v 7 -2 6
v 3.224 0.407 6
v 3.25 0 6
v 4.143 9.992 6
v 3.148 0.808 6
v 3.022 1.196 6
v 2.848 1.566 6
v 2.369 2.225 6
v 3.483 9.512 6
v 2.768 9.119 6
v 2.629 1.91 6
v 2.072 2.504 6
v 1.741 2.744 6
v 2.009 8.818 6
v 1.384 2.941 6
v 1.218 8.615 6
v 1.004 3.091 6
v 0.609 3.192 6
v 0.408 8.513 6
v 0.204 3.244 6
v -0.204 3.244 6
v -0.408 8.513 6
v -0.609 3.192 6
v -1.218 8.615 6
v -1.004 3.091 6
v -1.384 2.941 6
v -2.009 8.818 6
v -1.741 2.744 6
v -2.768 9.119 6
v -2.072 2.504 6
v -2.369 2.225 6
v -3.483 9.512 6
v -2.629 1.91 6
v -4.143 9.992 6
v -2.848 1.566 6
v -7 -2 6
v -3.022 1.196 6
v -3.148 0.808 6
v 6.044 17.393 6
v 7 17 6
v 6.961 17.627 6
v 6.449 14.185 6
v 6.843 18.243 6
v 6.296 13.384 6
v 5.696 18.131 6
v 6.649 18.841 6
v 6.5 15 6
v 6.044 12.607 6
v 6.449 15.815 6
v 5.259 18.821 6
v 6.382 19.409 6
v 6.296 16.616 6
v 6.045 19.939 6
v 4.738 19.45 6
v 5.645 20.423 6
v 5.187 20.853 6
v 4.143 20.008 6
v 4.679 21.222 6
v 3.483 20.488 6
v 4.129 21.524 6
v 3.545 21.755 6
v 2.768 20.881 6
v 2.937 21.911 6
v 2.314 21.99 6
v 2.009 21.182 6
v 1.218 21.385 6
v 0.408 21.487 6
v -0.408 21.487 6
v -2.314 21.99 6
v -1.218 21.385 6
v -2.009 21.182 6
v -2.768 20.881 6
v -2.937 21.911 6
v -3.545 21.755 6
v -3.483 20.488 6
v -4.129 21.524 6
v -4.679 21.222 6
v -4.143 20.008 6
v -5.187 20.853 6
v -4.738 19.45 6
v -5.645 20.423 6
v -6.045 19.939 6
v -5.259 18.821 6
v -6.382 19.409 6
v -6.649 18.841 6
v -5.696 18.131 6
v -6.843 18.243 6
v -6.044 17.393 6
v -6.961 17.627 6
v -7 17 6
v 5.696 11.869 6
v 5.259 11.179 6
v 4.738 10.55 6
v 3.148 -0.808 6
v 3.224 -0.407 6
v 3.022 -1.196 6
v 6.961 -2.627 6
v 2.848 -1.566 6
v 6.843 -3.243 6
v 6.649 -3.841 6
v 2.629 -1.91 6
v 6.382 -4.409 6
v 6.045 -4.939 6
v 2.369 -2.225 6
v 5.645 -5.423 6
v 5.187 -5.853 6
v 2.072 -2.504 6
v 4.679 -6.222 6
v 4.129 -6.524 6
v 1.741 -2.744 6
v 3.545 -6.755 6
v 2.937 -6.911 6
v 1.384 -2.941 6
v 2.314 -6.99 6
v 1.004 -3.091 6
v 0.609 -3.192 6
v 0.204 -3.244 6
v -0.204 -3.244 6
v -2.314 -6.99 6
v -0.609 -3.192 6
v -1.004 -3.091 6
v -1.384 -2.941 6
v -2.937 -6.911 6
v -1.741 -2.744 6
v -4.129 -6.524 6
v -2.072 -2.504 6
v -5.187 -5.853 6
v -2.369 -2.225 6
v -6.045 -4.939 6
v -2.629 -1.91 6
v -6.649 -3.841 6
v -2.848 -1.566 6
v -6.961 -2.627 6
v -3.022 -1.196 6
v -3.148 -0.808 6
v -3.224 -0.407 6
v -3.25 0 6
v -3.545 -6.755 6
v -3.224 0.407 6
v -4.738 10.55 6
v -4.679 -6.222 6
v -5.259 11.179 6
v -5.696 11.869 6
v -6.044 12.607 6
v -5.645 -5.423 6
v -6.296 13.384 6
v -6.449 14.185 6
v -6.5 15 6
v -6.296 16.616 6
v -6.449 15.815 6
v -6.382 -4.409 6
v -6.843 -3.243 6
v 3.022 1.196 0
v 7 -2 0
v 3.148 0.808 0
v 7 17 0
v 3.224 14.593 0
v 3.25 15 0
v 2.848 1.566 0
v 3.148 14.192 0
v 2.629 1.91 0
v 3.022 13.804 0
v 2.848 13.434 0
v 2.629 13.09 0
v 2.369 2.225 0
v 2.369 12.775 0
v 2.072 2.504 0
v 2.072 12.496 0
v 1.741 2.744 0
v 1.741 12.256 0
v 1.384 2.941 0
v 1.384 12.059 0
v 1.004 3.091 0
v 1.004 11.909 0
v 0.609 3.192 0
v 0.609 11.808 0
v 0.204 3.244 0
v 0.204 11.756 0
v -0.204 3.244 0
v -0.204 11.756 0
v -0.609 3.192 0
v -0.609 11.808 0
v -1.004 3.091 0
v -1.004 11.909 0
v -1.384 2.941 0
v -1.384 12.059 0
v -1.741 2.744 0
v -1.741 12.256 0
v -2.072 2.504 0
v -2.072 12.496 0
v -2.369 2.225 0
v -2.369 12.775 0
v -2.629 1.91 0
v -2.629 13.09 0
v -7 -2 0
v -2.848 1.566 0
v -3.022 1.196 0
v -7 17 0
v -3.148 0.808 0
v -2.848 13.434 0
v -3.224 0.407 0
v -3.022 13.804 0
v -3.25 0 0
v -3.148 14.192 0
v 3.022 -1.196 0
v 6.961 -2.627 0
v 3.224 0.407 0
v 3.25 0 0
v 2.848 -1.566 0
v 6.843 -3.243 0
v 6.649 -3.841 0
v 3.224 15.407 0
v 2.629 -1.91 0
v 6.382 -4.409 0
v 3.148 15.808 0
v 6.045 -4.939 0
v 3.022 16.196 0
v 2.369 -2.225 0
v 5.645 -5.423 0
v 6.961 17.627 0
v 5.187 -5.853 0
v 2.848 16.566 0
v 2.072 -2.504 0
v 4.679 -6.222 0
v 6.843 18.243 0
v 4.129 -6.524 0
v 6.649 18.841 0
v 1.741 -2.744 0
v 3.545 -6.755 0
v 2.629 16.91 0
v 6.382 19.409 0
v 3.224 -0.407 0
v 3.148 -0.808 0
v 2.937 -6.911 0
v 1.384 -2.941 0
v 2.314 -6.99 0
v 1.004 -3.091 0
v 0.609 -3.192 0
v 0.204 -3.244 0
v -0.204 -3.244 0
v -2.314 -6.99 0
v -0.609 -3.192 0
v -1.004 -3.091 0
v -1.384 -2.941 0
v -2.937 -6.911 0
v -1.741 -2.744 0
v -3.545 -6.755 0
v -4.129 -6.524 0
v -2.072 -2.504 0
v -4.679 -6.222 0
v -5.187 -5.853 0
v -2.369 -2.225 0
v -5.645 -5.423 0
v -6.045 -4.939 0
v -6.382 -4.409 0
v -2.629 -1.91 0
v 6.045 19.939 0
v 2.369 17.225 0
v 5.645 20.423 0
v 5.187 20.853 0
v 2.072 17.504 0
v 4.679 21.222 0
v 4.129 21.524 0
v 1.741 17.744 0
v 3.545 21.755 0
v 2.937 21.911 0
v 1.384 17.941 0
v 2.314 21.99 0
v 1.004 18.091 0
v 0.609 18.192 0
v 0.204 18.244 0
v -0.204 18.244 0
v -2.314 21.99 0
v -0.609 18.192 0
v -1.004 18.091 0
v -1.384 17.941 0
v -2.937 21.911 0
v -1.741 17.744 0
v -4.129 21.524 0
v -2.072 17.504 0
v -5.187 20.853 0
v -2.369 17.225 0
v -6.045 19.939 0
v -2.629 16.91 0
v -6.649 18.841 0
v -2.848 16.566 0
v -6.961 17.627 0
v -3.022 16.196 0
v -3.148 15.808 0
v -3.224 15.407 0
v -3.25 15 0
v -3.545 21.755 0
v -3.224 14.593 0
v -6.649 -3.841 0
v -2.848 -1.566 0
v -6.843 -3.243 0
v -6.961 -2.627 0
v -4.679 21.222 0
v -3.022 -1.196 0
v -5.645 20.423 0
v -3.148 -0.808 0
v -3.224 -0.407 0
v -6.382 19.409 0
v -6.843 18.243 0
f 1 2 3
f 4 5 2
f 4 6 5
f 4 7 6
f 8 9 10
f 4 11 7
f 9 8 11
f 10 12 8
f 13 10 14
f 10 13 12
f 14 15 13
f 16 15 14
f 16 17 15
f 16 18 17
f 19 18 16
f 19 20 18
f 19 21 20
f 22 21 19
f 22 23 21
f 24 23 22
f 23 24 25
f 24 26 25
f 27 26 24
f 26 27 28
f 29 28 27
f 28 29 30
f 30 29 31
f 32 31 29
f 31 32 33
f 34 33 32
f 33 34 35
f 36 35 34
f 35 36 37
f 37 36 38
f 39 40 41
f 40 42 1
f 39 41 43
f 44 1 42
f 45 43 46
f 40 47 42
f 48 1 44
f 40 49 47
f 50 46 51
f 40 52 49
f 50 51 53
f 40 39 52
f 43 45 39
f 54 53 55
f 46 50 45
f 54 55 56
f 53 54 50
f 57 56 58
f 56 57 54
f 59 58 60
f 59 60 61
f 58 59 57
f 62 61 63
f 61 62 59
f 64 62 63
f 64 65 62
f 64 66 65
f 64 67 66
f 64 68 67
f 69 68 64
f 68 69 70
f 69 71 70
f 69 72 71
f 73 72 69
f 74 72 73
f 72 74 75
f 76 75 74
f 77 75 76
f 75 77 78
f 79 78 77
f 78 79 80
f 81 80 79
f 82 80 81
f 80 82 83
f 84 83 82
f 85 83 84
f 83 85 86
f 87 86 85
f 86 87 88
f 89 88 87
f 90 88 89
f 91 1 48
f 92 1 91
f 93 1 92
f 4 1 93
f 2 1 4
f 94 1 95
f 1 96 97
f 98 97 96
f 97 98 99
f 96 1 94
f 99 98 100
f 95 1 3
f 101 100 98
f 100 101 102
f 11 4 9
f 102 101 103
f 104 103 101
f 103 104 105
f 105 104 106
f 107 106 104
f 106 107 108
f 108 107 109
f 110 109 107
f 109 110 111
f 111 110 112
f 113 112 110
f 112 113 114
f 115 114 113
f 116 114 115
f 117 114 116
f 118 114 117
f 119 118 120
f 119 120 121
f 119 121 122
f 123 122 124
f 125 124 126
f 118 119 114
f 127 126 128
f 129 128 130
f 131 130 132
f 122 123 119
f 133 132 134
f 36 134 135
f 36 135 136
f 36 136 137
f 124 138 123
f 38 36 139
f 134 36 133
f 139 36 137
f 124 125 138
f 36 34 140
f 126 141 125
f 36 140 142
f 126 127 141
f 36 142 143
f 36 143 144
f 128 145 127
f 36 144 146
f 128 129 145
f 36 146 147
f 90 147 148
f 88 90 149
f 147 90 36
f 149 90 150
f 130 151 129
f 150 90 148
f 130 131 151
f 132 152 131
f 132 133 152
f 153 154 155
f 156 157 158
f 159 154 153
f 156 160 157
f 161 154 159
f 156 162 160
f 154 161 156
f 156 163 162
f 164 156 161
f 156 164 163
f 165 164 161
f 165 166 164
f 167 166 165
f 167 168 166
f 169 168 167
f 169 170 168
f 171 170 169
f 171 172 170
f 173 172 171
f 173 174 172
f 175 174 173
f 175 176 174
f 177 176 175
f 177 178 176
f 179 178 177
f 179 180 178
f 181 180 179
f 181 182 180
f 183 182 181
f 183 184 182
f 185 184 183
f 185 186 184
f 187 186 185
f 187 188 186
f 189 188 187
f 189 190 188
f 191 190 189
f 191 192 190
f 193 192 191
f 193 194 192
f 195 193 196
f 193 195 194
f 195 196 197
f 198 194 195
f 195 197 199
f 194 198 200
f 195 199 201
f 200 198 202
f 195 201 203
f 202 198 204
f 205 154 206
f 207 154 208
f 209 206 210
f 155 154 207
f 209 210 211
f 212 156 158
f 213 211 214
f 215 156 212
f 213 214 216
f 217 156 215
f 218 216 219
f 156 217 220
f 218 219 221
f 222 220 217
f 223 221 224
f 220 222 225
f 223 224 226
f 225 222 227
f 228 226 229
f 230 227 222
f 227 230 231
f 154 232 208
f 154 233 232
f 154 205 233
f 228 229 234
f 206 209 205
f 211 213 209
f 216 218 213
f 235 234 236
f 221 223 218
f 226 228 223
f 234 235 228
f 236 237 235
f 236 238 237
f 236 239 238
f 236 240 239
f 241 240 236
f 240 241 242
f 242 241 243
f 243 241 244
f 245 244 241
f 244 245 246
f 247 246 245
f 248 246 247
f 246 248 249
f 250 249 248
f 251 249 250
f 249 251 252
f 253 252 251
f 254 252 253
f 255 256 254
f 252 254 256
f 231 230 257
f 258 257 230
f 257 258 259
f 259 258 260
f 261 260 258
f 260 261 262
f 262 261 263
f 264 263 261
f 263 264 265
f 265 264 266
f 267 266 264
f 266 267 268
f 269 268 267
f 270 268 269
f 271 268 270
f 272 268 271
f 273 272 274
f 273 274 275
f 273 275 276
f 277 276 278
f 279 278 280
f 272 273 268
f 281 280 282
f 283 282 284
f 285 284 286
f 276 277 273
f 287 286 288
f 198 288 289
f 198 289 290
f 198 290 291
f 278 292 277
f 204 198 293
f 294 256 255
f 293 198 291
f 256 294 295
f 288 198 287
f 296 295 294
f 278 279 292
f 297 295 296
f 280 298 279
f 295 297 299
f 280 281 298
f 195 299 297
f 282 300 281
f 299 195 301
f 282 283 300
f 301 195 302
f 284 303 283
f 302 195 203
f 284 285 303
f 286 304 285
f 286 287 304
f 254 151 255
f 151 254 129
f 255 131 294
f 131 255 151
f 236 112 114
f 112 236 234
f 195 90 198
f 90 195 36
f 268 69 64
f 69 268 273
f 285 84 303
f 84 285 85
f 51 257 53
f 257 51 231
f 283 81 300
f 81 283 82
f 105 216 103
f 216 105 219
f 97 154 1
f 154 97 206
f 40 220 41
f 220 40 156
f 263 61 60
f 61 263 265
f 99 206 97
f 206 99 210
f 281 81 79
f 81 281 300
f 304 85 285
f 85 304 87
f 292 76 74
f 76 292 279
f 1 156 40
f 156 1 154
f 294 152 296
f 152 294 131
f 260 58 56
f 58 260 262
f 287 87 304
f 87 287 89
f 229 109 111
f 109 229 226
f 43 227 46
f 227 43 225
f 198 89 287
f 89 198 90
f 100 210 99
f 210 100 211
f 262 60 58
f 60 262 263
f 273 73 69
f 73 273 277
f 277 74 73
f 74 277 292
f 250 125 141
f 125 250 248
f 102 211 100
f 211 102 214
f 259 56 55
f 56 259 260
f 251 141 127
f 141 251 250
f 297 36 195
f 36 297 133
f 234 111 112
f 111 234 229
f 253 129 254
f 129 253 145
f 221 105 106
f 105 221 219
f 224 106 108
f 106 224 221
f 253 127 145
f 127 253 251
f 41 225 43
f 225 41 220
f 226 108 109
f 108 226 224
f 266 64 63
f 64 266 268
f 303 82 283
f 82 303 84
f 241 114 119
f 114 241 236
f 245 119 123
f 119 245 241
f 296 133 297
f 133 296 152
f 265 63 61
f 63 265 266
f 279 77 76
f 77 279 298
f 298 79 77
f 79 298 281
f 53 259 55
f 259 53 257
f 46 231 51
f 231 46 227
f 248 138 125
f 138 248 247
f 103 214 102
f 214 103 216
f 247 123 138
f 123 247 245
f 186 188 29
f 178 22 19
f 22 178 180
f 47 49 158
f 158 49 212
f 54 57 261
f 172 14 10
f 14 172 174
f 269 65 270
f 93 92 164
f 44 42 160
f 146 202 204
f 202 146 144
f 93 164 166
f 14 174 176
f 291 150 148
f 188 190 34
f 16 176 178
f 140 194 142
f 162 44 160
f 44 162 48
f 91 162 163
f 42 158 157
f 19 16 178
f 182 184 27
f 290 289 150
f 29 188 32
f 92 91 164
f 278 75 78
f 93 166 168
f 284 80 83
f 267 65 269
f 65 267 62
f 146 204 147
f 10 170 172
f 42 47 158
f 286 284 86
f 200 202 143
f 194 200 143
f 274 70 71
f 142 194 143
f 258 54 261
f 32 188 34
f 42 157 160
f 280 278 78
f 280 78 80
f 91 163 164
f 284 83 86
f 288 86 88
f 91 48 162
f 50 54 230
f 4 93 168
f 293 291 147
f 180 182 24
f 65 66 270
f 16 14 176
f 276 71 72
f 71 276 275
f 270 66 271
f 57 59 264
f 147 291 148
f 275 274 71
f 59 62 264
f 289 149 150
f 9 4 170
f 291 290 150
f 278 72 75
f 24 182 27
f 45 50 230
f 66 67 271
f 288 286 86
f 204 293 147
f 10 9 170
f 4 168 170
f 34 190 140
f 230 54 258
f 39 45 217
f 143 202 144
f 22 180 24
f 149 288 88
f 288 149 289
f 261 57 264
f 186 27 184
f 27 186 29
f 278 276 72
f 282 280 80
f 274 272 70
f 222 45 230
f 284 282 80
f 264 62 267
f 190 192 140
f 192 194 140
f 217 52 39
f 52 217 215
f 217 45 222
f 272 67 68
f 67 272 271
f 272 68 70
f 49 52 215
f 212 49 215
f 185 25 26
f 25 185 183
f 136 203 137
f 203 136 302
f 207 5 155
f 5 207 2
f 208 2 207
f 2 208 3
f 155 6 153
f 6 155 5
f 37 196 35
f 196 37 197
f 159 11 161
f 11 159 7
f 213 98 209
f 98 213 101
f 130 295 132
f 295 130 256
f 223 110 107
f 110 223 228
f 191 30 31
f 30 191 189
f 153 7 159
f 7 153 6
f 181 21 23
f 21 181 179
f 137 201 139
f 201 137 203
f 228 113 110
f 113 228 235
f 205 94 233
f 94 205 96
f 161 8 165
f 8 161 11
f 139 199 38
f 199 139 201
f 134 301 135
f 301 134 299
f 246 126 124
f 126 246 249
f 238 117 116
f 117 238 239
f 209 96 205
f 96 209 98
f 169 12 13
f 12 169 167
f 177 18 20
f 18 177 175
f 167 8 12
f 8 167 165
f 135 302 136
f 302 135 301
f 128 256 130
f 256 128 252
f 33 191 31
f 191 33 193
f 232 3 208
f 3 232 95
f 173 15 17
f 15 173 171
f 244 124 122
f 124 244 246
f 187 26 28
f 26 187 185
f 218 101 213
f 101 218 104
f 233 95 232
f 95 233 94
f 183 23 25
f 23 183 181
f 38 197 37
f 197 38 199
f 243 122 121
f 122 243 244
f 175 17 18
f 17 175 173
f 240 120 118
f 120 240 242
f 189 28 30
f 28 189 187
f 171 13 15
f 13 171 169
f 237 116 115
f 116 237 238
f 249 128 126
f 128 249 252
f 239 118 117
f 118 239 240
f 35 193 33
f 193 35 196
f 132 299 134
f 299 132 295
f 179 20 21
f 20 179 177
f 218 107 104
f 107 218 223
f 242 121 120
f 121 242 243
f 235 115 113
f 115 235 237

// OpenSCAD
$fn = 50;


difference() {
	union() {
		cylinder(h = 6, r = 7.0000000000);
		translate(v = [0.0000000000, 7.5000000000, 0]) {
			hull() {
				translate(v = [-2.0000000000, 9.5000000000, 0]) {
					cylinder(h = 6, r = 5);
				}
				translate(v = [2.0000000000, 9.5000000000, 0]) {
					cylinder(h = 6, r = 5);
				}
				translate(v = [-2.0000000000, -9.5000000000, 0]) {
					cylinder(h = 6, r = 5);
				}
				translate(v = [2.0000000000, -9.5000000000, 0]) {
					cylinder(h = 6, r = 5);
				}
			}
		}
		translate(v = [0.0000000000, 7.5000000000, 0]) {
			hull() {
				translate(v = [-2.0000000000, 9.5000000000, 0]) {
					cylinder(h = 6, r = 5);
				}
				translate(v = [2.0000000000, 9.5000000000, 0]) {
					cylinder(h = 6, r = 5);
				}
				translate(v = [-2.0000000000, -9.5000000000, 0]) {
					cylinder(h = 6, r = 5);
				}
				translate(v = [2.0000000000, -9.5000000000, 0]) {
					cylinder(h = 6, r = 5);
				}
			}
		}
	}
	union() {
		translate(v = [0.0000000000, 15.0000000000, 6]) {
			rotate(a = [0, 0, 0]) {
				difference() {
					union() {
						#translate(v = [0, 0, -6.0000000000]) {
							cylinder(h = 6, r = 2.2500000000);
						}
						#translate(v = [0, 0, -6]) {
							cylinder(h = 6, r1 = 3.2500000000, r2 = 6.5000000000);
						}
						#translate(v = [0, 0, -6.0000000000]) {
							cylinder(h = 6, r = 3.2500000000);
						}
						#translate(v = [0, 0, -6.0000000000]) {
							cylinder(h = 6, r = 2.2500000000);
						}
					}
					union();
				}
			}
		}
		translate(v = [0.0000000000, 15.0000000000, 6]) {
			rotate(a = [0, 0, 0]) {
				difference() {
					union() {
						#translate(v = [0, 0, -6.0000000000]) {
							cylinder(h = 6, r = 2.2500000000);
						}
						#translate(v = [0, 0, -6]) {
							cylinder(h = 6, r1 = 3.2500000000, r2 = 6.5000000000);
						}
						#translate(v = [0, 0, -6.0000000000]) {
							cylinder(h = 6, r = 3.2500000000);
						}
						#translate(v = [0, 0, -6.0000000000]) {
							cylinder(h = 6, r = 2.2500000000);
						}
					}
					union();
				}
			}
		}
		translate(v = [0, 0, -100]) {
			cylinder(h = 200, r = 3.2500000000);
		}
		translate(v = [0, 0, -100]) {
			cylinder(h = 200, r = 1.8000000000);
		}
	}
}
